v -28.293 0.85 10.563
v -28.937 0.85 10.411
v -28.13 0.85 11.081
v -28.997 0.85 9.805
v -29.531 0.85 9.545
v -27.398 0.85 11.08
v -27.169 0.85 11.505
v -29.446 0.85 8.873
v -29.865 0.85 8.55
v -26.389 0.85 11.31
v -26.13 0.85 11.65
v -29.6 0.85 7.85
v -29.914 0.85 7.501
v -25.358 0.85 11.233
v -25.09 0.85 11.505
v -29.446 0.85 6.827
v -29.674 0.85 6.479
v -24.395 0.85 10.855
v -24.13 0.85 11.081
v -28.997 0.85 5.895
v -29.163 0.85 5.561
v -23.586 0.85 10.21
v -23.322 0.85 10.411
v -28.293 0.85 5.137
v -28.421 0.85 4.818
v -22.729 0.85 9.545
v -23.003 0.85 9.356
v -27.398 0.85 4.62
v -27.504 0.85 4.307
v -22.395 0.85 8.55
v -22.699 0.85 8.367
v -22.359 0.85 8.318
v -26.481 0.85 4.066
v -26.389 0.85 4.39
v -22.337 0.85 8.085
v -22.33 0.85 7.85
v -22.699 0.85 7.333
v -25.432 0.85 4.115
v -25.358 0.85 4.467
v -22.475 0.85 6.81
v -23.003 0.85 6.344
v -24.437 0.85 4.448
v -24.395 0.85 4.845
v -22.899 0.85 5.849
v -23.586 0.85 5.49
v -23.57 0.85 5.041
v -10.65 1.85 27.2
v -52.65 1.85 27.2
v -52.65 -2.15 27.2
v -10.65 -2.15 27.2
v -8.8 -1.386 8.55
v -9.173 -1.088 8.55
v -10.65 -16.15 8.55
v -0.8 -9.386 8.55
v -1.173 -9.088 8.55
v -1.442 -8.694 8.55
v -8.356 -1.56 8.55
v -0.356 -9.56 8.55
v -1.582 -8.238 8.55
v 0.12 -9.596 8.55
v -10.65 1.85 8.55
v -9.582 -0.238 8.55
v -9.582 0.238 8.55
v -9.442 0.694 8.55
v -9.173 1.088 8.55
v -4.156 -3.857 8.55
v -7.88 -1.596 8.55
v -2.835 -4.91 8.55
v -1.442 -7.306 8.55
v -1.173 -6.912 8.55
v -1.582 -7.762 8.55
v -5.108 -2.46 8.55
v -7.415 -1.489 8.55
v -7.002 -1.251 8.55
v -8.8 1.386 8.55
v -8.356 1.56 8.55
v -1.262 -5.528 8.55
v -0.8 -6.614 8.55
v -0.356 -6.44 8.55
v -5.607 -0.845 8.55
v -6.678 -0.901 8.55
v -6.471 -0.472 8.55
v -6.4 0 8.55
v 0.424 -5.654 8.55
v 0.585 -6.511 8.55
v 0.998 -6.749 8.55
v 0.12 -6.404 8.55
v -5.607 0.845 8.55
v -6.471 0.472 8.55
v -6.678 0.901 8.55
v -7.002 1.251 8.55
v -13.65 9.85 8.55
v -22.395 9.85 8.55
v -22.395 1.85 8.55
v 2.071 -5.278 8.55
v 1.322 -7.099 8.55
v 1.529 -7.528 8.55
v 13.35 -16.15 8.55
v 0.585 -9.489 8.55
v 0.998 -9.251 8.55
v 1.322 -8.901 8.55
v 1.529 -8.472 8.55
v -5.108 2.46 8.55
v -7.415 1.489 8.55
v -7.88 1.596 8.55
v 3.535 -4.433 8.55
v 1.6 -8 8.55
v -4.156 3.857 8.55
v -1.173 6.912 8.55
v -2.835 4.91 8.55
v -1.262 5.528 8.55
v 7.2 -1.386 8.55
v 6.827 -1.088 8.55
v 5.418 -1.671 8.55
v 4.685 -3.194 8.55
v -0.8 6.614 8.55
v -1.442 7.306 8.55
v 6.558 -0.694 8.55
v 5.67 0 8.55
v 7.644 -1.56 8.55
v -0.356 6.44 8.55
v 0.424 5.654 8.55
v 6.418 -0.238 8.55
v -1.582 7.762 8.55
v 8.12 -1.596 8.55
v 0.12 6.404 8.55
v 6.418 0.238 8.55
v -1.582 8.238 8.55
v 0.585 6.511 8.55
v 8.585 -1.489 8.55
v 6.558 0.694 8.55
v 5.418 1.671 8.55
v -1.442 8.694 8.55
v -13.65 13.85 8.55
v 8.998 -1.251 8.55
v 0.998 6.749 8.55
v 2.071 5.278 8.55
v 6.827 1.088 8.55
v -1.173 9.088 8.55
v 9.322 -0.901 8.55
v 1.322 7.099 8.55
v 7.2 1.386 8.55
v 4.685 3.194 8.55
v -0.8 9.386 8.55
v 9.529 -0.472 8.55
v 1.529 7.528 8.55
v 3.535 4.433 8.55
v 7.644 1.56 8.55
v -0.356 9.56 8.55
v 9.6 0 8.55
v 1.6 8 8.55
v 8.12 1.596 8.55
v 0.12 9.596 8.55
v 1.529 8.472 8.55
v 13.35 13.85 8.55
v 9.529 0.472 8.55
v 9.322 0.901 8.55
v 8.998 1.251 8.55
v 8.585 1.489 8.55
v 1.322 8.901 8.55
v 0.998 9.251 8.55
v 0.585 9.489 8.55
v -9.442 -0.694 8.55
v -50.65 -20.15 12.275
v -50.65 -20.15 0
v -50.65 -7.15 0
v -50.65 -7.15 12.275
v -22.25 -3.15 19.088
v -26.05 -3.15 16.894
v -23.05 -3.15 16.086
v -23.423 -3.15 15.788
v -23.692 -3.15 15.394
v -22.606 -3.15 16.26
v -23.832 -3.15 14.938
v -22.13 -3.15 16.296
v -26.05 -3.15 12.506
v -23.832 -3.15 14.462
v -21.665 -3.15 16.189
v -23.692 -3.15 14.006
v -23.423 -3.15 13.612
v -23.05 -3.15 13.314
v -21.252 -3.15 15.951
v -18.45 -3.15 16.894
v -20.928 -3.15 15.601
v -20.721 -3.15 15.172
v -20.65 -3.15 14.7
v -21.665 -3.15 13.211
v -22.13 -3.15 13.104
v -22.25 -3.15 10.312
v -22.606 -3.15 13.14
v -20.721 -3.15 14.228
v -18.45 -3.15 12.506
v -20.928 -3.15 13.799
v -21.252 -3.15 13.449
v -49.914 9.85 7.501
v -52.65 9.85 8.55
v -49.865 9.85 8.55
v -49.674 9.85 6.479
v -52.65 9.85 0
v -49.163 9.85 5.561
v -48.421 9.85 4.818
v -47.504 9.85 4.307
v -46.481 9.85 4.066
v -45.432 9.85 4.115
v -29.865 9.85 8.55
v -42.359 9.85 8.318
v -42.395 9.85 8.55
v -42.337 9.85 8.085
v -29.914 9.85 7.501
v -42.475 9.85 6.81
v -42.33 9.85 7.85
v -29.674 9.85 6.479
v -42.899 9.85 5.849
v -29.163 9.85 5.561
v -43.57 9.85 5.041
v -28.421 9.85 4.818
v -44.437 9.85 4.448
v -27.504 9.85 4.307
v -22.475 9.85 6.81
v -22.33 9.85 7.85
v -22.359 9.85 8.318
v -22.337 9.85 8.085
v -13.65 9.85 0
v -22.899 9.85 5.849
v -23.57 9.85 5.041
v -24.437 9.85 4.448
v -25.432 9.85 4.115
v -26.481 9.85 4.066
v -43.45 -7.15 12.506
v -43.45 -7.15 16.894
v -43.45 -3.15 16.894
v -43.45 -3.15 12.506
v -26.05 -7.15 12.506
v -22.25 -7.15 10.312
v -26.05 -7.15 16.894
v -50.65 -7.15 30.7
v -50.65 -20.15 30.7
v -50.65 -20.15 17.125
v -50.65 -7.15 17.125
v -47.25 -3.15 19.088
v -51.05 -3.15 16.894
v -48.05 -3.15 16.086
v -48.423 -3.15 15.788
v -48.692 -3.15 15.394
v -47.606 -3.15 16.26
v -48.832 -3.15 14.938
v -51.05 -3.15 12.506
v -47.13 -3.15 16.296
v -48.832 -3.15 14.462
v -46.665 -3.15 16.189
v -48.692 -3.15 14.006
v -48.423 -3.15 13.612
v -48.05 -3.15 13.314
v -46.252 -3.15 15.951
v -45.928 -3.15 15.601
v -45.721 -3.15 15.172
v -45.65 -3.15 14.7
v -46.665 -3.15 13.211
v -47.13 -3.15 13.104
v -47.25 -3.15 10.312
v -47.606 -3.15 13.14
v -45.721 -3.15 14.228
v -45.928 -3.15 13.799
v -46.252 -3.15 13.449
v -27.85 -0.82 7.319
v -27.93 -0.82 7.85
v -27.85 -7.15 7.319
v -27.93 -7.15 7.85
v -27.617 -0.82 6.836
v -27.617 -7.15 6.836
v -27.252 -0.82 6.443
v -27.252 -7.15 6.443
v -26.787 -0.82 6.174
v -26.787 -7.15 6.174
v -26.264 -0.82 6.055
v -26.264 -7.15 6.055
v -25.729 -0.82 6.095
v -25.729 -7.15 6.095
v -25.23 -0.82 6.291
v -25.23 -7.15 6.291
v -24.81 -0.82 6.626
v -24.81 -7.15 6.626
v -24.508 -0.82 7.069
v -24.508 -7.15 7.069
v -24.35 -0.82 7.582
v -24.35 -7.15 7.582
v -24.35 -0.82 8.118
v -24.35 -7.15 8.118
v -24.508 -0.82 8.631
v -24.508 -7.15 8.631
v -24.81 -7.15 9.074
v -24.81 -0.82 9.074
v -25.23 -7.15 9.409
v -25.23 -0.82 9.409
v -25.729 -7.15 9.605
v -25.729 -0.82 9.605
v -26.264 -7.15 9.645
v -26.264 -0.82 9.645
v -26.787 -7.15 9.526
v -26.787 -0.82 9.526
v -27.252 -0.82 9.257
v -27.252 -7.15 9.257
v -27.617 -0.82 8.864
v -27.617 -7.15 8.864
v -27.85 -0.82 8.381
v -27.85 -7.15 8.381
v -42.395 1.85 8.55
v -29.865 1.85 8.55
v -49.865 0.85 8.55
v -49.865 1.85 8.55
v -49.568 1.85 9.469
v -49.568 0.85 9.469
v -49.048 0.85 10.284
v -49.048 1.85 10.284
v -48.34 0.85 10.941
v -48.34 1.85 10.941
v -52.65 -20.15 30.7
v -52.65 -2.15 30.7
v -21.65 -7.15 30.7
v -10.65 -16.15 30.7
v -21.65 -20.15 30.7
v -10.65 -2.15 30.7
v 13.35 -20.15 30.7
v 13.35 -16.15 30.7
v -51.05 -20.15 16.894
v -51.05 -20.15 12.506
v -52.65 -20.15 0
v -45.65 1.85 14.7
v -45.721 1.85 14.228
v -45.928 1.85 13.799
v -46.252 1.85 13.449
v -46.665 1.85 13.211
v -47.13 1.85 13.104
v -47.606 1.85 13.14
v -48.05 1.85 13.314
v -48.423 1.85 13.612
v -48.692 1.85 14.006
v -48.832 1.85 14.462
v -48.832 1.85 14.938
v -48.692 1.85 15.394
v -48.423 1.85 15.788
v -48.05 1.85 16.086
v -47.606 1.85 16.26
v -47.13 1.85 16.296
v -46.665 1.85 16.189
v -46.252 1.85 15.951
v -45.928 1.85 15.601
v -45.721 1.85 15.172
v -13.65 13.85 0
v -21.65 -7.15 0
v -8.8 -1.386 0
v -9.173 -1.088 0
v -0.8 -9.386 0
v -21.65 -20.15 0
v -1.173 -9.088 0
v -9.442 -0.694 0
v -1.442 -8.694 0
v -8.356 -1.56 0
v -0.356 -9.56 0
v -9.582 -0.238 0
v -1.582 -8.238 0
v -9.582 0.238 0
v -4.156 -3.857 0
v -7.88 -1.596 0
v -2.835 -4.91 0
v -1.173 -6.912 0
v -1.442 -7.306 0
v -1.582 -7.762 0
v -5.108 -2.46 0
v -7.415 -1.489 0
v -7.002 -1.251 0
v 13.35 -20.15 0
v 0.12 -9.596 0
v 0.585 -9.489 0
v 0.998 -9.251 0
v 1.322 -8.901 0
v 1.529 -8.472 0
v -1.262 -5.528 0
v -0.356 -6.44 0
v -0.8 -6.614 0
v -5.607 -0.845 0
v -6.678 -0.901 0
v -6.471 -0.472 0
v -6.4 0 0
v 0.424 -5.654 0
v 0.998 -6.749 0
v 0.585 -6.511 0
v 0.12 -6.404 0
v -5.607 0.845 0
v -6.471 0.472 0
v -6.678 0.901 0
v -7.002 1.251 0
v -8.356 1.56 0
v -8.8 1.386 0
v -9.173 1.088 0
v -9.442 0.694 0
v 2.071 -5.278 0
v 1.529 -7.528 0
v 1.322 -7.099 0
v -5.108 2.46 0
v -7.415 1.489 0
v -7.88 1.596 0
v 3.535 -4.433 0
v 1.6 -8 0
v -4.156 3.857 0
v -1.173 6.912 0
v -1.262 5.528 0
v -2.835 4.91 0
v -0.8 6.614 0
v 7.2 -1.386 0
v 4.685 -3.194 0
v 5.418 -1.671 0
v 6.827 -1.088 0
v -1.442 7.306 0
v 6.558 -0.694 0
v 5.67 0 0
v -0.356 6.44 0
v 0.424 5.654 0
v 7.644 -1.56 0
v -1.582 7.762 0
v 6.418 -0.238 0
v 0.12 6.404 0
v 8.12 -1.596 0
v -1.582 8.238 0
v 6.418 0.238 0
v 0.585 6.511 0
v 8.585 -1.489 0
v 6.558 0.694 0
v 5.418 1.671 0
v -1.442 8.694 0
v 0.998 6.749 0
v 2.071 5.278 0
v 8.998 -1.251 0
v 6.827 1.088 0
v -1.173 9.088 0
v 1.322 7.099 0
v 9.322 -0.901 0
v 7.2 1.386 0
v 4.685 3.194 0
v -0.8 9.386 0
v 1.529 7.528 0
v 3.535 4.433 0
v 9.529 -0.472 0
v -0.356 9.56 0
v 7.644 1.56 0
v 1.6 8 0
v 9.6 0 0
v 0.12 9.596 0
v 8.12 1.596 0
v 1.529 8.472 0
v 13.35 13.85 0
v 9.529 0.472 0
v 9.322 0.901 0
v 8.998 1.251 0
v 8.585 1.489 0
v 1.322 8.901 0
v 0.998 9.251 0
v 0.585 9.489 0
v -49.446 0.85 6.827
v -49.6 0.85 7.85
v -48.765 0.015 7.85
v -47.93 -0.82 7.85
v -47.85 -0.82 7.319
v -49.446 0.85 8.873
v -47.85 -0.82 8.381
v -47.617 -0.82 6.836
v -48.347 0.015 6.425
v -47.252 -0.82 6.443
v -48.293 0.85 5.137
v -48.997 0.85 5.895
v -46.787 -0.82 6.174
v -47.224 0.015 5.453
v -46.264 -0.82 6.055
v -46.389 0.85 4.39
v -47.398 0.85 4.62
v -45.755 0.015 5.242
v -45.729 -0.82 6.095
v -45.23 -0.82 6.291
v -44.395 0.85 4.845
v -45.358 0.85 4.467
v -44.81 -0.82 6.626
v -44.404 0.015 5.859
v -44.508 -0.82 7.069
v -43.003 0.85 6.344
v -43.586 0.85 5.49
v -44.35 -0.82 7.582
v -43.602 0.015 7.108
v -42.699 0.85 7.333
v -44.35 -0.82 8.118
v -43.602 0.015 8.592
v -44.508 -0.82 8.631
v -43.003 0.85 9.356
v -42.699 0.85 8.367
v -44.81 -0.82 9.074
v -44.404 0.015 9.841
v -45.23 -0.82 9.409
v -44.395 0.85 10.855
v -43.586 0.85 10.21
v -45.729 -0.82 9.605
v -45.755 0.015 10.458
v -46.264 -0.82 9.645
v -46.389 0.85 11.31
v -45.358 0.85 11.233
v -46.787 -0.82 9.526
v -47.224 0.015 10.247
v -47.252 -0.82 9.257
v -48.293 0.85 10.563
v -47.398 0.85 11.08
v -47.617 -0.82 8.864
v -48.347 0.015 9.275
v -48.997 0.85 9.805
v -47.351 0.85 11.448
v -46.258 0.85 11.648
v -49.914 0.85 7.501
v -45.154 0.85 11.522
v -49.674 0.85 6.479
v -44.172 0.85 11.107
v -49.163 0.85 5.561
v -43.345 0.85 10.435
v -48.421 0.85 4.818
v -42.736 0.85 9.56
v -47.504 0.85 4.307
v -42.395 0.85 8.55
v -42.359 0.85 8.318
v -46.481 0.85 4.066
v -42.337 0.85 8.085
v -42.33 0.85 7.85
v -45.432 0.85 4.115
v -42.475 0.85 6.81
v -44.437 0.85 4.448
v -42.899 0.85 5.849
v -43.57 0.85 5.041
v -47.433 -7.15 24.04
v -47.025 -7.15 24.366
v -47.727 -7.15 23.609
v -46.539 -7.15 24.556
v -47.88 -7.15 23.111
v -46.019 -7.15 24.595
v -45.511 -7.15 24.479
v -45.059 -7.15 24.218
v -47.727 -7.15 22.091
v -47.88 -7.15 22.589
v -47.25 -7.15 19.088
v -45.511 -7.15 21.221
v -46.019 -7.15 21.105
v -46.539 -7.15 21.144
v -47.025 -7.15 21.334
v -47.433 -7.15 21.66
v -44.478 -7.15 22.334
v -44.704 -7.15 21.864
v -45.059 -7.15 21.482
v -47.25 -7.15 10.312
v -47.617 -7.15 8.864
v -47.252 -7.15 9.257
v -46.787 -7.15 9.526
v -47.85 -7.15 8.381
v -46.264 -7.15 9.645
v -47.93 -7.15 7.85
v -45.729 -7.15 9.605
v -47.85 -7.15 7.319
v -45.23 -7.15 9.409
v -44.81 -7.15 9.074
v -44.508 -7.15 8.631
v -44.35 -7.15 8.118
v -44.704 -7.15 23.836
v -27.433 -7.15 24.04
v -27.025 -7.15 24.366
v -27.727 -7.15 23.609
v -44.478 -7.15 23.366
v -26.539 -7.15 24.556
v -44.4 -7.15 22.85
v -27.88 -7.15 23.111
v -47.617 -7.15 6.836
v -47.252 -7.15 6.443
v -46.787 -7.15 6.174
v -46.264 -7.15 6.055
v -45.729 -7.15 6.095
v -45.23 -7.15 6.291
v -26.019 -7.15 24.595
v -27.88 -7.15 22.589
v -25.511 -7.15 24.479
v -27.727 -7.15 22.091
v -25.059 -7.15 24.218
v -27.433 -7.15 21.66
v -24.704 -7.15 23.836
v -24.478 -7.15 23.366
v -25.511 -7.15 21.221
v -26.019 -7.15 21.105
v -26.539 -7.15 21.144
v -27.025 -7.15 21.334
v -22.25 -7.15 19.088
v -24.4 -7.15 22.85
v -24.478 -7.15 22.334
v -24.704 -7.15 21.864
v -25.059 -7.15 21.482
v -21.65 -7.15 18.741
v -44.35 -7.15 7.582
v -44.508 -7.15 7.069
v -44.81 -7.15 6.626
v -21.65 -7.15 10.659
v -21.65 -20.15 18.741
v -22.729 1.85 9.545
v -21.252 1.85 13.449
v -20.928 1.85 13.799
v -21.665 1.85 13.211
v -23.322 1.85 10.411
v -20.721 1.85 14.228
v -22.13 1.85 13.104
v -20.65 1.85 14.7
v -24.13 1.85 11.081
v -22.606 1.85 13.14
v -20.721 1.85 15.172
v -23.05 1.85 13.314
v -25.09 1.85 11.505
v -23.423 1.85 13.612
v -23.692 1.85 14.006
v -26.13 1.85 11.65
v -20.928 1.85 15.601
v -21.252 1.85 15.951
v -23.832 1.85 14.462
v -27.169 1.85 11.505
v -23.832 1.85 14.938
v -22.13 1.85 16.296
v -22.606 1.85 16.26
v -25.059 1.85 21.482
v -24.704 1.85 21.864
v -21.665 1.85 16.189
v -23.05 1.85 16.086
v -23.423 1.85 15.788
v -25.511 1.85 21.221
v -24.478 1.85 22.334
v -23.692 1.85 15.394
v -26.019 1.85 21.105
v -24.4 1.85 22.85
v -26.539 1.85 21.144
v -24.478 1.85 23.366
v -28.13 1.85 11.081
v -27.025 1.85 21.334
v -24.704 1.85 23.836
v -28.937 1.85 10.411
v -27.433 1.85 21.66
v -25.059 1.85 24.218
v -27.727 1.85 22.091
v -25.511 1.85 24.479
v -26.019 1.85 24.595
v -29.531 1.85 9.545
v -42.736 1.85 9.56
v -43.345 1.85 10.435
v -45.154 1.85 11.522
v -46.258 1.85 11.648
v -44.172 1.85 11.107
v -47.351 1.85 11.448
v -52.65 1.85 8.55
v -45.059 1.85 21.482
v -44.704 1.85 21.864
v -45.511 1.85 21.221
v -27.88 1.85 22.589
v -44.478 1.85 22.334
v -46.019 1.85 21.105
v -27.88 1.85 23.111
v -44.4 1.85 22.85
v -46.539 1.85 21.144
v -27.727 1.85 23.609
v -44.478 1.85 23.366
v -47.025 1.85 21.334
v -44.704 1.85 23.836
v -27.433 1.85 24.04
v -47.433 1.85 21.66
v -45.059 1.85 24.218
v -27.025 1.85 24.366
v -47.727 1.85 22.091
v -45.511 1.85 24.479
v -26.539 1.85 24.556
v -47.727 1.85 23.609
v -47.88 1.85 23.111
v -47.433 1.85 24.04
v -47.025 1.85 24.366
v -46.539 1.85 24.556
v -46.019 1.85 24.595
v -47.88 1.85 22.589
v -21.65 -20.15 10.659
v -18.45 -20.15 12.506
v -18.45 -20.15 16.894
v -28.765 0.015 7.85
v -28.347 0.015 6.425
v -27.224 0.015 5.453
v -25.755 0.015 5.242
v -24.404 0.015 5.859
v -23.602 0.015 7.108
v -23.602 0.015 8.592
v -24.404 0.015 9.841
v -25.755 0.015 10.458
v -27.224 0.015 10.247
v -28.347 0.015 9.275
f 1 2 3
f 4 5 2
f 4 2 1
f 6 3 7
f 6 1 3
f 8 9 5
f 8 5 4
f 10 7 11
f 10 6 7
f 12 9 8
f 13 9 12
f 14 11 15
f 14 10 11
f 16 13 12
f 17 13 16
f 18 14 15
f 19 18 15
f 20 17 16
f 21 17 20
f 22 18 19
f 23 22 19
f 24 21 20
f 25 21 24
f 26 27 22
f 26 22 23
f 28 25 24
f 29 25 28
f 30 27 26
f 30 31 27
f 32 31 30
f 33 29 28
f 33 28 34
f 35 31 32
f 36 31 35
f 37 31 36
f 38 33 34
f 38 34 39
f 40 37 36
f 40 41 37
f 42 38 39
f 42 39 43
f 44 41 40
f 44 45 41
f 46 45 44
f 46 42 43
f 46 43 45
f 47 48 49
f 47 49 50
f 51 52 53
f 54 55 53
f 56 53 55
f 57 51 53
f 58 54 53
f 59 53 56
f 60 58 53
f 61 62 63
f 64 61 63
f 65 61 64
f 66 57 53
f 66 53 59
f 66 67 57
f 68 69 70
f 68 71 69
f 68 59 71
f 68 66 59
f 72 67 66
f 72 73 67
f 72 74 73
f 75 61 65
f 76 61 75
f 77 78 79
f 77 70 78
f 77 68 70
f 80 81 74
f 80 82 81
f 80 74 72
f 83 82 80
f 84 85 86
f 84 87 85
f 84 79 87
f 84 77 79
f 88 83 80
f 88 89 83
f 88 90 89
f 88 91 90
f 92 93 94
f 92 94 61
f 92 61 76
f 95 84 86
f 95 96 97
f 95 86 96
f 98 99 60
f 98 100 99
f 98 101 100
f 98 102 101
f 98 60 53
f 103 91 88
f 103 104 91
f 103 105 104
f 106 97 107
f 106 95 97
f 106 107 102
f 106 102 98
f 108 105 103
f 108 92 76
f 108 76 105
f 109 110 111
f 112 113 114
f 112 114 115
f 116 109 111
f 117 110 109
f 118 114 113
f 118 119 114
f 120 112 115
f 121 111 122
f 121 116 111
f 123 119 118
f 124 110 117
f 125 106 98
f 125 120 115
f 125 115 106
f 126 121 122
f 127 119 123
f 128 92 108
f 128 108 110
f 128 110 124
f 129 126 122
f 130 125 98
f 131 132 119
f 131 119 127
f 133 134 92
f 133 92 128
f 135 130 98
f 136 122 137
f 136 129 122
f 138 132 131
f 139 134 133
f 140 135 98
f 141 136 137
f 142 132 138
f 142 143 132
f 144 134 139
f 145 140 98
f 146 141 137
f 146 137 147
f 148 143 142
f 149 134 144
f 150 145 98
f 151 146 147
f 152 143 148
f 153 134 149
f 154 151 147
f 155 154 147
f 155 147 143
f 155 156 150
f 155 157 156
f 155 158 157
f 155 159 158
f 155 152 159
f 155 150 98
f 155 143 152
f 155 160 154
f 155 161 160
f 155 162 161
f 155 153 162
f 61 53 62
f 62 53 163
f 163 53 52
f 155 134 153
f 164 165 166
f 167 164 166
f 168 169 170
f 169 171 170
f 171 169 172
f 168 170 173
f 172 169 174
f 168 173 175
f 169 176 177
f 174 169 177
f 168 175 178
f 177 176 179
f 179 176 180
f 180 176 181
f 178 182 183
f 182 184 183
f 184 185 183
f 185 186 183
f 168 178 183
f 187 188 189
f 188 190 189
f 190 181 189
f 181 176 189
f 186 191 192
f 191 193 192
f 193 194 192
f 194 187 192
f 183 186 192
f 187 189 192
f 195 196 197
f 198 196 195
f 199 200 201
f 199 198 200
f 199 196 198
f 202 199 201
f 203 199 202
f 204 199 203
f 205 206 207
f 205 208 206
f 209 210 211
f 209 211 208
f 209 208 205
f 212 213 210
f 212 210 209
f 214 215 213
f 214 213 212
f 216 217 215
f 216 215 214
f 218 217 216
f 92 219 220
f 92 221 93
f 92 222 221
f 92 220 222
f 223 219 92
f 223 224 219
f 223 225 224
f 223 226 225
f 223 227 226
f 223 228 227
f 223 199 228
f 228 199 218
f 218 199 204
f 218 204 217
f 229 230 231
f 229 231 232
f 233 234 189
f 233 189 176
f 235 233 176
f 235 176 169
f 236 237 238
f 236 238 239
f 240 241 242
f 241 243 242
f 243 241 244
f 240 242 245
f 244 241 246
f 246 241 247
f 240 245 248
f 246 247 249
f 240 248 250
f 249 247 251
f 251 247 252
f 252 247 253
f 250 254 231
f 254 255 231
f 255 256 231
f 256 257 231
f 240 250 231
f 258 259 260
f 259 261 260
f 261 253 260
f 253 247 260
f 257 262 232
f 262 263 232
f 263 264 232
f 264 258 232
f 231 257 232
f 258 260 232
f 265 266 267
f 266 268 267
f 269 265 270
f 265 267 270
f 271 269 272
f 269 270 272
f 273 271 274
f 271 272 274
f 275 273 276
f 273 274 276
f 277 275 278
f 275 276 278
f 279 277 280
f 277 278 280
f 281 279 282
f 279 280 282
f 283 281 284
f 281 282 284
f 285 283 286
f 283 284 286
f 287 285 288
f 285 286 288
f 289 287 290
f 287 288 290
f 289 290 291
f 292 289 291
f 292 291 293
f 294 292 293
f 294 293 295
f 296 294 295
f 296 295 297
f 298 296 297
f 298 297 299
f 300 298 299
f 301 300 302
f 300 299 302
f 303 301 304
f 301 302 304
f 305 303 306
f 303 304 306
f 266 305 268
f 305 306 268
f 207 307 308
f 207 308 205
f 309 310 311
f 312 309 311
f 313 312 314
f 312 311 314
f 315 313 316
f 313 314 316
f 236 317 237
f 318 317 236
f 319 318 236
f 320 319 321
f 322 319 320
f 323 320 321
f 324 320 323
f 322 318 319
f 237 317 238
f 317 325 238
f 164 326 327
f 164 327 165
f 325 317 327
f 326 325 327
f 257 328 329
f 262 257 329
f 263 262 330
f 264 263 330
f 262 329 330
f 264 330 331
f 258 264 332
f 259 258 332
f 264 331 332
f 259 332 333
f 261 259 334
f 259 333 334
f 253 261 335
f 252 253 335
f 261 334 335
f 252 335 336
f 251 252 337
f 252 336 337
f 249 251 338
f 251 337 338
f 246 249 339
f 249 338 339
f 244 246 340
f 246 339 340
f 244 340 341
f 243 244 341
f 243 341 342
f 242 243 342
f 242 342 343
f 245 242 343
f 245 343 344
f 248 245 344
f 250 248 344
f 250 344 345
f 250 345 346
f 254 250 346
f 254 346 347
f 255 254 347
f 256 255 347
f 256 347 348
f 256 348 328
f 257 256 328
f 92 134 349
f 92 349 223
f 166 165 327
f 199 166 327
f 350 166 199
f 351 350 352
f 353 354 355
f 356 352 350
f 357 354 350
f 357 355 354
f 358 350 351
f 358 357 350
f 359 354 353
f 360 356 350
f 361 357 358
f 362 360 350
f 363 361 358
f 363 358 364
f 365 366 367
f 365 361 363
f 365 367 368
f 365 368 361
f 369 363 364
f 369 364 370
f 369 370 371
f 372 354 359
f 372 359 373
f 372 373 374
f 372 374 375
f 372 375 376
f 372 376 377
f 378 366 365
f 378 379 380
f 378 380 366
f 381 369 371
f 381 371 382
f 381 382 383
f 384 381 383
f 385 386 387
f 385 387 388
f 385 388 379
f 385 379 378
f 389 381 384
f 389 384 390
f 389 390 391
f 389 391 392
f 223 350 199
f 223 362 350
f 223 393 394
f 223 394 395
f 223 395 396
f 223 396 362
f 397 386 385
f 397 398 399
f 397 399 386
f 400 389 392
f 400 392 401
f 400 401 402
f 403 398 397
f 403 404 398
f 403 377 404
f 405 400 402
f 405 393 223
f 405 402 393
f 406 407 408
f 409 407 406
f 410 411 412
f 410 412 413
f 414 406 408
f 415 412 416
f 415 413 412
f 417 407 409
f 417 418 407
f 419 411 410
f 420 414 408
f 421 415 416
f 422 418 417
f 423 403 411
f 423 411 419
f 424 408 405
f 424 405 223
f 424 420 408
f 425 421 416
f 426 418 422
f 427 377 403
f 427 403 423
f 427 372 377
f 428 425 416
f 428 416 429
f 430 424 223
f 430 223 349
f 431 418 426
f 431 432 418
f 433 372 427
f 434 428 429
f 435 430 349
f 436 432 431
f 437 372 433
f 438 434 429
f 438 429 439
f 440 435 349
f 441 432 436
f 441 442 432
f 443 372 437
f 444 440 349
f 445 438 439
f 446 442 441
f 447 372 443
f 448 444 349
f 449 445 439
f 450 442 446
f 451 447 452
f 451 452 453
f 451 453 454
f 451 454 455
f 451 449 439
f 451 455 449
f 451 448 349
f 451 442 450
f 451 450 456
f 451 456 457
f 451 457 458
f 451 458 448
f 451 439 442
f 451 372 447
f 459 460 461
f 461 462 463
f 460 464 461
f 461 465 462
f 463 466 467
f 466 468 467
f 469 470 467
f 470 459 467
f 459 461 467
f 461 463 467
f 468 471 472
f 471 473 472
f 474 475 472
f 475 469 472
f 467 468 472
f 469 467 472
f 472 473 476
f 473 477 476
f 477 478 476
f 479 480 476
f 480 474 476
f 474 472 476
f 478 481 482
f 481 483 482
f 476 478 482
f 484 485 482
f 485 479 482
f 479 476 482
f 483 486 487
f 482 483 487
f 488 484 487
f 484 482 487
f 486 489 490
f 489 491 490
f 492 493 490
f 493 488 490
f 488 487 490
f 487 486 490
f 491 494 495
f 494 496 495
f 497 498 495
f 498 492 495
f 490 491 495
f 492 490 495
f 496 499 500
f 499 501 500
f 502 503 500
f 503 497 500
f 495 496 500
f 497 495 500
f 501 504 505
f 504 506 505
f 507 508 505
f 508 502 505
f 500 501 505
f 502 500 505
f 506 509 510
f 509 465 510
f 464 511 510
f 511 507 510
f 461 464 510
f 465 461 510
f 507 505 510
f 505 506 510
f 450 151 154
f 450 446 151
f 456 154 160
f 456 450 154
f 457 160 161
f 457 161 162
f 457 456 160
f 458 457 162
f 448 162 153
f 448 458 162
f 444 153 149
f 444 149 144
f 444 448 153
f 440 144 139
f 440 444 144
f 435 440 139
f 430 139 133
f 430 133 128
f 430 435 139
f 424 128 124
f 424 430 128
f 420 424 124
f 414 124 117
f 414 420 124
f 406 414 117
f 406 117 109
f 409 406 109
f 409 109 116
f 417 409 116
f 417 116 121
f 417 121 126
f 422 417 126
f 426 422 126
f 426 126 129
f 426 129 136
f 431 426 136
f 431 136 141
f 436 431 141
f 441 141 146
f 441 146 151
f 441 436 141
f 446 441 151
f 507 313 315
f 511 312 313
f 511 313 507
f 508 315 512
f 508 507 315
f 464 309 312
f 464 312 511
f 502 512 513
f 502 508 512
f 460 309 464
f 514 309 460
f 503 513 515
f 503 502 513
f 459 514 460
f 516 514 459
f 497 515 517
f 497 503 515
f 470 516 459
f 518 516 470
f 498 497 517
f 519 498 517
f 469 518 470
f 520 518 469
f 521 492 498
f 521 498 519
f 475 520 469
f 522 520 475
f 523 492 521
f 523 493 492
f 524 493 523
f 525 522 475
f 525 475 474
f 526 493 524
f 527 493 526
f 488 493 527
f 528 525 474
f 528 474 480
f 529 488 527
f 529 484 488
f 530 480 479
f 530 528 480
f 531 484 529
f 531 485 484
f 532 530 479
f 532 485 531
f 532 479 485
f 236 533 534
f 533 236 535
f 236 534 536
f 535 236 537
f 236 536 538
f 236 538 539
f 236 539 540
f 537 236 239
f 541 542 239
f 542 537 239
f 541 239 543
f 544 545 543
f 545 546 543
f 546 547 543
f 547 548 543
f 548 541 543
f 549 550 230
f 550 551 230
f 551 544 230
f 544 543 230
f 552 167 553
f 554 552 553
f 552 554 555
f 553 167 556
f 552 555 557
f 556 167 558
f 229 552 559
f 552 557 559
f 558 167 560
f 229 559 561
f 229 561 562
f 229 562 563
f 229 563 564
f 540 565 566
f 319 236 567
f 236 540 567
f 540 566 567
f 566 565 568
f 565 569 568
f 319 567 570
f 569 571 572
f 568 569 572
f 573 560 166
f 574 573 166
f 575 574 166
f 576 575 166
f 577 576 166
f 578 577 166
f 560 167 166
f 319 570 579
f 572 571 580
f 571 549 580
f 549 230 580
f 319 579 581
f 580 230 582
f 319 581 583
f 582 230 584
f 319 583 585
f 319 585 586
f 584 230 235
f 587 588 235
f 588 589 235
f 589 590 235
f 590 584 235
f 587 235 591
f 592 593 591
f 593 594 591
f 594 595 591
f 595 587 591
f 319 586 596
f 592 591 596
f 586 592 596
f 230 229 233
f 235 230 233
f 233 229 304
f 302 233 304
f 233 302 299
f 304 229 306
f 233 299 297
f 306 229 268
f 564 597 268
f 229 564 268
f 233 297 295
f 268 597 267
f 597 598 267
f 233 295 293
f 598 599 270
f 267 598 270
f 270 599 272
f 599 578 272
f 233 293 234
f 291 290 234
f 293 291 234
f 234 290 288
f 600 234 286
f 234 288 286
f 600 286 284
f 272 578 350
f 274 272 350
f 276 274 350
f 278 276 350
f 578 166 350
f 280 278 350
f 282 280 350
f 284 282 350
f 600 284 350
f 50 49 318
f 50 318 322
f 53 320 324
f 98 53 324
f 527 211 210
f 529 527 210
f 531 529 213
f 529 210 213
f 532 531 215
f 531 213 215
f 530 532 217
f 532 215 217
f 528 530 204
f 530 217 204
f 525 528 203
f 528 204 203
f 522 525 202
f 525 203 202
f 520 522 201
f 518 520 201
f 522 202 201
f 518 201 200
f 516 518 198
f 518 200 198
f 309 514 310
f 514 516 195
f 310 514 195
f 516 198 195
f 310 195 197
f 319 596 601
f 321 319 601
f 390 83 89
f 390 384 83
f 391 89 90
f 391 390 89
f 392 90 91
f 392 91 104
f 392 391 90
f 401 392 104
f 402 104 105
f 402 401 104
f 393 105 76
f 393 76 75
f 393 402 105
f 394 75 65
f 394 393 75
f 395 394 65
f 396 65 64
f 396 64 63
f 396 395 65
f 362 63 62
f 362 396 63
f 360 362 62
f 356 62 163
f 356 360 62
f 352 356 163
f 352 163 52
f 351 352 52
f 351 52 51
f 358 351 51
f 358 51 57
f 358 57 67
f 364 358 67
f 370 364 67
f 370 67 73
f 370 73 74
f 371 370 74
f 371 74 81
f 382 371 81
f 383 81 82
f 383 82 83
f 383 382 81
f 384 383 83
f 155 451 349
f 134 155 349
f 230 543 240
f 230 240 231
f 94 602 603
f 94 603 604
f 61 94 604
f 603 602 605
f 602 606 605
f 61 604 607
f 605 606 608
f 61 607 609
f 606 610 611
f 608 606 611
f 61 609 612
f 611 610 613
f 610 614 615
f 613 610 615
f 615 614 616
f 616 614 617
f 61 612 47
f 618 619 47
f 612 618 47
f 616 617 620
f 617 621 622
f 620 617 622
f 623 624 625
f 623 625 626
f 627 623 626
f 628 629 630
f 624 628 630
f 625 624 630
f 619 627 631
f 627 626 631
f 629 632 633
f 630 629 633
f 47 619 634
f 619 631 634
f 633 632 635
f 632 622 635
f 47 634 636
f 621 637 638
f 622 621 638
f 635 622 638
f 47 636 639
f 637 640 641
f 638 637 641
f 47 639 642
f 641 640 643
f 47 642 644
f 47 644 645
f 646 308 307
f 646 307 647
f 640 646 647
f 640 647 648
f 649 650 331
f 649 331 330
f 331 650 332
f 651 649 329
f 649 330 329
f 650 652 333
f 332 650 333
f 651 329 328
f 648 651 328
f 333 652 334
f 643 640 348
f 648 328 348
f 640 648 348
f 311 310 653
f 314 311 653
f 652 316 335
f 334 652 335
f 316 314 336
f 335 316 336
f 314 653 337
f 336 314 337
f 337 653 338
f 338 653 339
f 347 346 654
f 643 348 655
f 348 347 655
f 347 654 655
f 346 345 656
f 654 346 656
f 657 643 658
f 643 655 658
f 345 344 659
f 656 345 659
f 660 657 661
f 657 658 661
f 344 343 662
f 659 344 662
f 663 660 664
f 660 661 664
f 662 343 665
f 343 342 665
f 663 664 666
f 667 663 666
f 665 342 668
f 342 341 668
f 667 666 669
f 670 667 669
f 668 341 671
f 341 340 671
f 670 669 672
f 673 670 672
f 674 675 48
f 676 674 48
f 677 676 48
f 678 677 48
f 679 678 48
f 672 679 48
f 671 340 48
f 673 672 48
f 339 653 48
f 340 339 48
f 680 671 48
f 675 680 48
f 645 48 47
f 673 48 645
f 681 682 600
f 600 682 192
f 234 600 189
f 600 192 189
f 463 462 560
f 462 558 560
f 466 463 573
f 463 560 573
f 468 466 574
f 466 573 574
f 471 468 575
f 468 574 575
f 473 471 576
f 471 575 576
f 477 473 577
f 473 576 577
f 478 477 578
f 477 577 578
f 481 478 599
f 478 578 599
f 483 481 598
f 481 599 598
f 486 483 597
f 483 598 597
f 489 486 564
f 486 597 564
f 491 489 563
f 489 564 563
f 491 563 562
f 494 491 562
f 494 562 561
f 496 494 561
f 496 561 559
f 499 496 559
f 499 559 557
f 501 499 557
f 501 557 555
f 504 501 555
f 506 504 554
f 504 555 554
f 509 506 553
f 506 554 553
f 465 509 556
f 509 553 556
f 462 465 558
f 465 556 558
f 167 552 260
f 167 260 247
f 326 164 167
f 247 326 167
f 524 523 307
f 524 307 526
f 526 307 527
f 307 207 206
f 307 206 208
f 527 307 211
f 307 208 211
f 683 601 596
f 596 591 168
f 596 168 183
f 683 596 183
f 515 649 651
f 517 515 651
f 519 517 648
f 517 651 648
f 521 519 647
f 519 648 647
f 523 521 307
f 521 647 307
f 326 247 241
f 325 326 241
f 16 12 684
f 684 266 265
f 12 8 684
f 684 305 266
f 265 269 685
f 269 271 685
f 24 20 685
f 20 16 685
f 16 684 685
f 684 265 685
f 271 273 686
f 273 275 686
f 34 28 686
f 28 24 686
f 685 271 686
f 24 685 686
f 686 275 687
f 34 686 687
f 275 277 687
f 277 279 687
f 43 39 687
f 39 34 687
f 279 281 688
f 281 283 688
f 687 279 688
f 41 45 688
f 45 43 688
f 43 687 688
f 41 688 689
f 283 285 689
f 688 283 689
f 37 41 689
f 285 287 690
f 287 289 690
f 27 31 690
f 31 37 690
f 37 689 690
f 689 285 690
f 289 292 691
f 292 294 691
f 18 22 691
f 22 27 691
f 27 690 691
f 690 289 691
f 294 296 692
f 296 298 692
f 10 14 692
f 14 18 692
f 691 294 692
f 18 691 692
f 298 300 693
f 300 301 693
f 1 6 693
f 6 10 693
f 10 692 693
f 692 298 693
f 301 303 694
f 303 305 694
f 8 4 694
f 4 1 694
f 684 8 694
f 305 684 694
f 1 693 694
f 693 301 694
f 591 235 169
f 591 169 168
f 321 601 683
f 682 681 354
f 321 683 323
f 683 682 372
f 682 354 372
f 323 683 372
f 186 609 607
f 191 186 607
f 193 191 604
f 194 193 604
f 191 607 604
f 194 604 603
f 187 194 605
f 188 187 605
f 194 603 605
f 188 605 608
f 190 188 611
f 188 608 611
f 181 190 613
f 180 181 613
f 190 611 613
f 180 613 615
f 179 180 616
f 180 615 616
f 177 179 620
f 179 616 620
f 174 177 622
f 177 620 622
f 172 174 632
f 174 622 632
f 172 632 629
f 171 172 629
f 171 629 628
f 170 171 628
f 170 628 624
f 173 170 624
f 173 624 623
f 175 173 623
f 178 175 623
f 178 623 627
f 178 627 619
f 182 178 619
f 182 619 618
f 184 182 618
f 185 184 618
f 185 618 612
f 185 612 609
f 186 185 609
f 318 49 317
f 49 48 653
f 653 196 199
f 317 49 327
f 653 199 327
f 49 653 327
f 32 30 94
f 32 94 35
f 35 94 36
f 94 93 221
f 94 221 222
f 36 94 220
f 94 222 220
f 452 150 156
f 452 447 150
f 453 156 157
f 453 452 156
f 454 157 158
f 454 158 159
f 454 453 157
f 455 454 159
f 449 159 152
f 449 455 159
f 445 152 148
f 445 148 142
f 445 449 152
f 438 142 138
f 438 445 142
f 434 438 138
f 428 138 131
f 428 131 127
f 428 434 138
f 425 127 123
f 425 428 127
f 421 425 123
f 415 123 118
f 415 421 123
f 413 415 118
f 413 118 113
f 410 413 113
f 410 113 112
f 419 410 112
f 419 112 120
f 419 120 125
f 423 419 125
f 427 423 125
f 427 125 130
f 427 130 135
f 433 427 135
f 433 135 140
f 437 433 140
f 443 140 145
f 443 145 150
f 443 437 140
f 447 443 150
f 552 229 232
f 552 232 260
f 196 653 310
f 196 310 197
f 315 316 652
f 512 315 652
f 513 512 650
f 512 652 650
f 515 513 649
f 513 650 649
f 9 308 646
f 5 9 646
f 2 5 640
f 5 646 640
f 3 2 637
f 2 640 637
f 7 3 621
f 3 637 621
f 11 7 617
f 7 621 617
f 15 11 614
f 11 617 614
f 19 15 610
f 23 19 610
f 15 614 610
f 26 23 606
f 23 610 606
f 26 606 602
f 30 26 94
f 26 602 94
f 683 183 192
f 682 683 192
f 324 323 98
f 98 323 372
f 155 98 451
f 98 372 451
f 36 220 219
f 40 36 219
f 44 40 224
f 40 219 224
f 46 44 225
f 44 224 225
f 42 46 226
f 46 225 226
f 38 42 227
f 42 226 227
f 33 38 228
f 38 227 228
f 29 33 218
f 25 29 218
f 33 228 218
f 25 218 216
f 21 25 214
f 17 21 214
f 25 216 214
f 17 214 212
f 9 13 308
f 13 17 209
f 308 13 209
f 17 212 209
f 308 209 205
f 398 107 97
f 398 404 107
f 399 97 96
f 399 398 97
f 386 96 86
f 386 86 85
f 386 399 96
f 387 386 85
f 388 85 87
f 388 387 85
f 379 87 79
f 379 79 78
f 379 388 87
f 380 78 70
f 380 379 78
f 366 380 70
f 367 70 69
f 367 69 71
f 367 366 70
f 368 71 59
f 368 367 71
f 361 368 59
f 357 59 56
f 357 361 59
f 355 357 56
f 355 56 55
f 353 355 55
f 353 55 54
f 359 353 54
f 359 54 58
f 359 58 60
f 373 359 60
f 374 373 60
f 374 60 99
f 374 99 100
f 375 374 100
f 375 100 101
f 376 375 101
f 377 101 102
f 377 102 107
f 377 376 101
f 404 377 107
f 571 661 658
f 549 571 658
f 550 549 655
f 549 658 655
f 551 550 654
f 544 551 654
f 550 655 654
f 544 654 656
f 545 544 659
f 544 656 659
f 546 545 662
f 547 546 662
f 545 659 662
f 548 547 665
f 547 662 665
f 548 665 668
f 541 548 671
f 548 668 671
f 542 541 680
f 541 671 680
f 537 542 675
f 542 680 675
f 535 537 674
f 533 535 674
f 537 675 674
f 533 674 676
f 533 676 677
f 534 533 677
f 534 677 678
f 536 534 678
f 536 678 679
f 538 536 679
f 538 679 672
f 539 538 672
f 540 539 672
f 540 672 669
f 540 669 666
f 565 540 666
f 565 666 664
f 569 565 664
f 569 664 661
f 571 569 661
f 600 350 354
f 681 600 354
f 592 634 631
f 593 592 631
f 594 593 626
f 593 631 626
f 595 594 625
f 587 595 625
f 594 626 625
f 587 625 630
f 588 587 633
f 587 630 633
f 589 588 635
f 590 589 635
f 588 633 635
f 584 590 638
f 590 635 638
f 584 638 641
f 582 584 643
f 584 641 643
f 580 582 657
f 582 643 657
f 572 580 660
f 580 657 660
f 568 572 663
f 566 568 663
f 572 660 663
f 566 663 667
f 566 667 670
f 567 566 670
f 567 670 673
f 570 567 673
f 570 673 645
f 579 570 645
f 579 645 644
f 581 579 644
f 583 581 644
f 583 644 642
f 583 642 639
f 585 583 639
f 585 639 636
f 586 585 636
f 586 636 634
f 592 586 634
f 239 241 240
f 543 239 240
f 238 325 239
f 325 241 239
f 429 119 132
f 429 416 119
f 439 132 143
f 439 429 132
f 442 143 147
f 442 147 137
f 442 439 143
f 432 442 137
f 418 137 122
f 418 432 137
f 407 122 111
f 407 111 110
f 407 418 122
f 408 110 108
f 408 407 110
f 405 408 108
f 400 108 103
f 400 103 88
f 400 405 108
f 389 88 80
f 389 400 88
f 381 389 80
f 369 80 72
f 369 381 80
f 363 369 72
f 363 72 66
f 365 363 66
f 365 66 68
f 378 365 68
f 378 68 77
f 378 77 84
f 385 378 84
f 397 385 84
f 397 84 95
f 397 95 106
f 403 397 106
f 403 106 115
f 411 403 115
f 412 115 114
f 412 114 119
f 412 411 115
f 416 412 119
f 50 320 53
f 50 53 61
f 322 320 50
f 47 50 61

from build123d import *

# Parameters (mm, degrees)
CROQUIS2_R                                           = 10.875
CROQUIS2_R_2                                         = 5.67
CROQUIS2_R_3                                         = 1.6
SALIENTE_EXTRUIR1_DEPTH                              = 30.7
CROQUIS4_W                                           = 24
CROQUIS4_H                                           = 30
CROQUIS4_R                                           = 1.6
CROQUIS4_R_2                                         = 5.67
CORTAR_EXTRUIR2_DEPTH                                = 22.7
CROQUIS3_W                                           = 12.3
CROQUIS3_H                                           = 8
CORTAR_EXTRUIR5_DEPTH                                = 42
CROQUIS5_R                                           = 1.6
CORTAR_EXTRUIR6_DEPTH                                = 35
CROQUIS7_R                                           = 1.6
CORTAR_EXTRUIR7_DEPTH                                = 4
CROQUIS9_W                                           = 8
CROQUIS9_H                                           = 4
SALIENTE_EXTRUIR4_DEPTH                              = 3
CROQUIS7_3_W                                         = 42
CROQUIS7_3_H                                         = 9.85
CORTAR_EXTRUIR8_DEPTH                                = 12
CORTAR_EXTRUIR9_START                                = 8
CORTAR_EXTRUIR9_DEPTH                                = 9
CROQUIS11_3_R                                        = 1.75
CORTAR_EXTRUIR10_DEPTH                               = 23
CORTAR_EXTRUIR11_START                               = -9
CORTAR_EXTRUIR11_DEPTH                               = 4
CORTAR_EXTRUIR11_DEPTH_BACK                          = 23
AVELLANADO_PARA_TORNILLO_CON_CABEZA_AVEL_D           = 3.6
AVELLANADO_PARA_TORNILLO_CON_CABEZA_AVEL_CSINK_D     = 6.94
AVELLANADO_PARA_TORNILLO_CON_CABEZA_AVEL_CSINK_ANGLE = 90
CROQUIS18_W                                          = 42
CROQUIS18_H                                          = 3.5
CORTAR_EXTRUIR12_DEPTH                               = 4
CROQUIS19_R                                          = 5.67
CROQUIS19_R_2                                        = 1.6
SALIENTE_EXTRUIR5_DEPTH                              = 0.55


with BuildPart() as part:
    # Croquis2 → Saliente-Extruir1 (new body)
    with BuildSketch(Plane.XY):
        Polygon((-52.65, 13.85), (-52.65, -20.15), (-50.65, -20.15), (-50.65, -17.65), (-50.65, -7.65), (-50.65, -7.15), (-49.65, -7.15), (-22.65, -7.15), (-21.65, -7.15), (-21.65, -7.65), (-21.65, -17.65), (-21.65, -20.15), (13.35, -20.15), (13.35, 13.85), align=None)
        Circle(CROQUIS2_R, mode=Mode.SUBTRACT)
        Circle(CROQUIS2_R)
        Circle(CROQUIS2_R_2, mode=Mode.SUBTRACT)
        with Locations((0, -8)):
            Circle(CROQUIS2_R_3, mode=Mode.SUBTRACT)
        with Locations((-8, 0)):
            Circle(CROQUIS2_R_3, mode=Mode.SUBTRACT)
        with Locations((8, 0)):
            Circle(CROQUIS2_R_3, mode=Mode.SUBTRACT)
        with Locations((0, 8)):
            Circle(CROQUIS2_R_3, mode=Mode.SUBTRACT)
    extrude(amount=SALIENTE_EXTRUIR1_DEPTH)

    # Croquis4 → Cortar-Extruir2 (cut)
    with BuildSketch(Plane.XY.offset(30.7)):
        with Locations((1.35, -1.15)):
            Rectangle(CROQUIS4_W, CROQUIS4_H)
        with Locations((0, -8)):
            Circle(CROQUIS4_R, mode=Mode.SUBTRACT)
        with Locations((-8, 0)):
            Circle(CROQUIS4_R, mode=Mode.SUBTRACT)
        Circle(CROQUIS4_R_2, mode=Mode.SUBTRACT)
        with Locations((0, 8)):
            Circle(CROQUIS4_R, mode=Mode.SUBTRACT)
        with Locations((8, 0)):
            Circle(CROQUIS4_R, mode=Mode.SUBTRACT)
    extrude(amount=-CORTAR_EXTRUIR2_DEPTH, mode=Mode.SUBTRACT)

    # Croquis3 → Cortar-Extruir5 (cut)
    with BuildSketch(Plane.ZY.offset(52.65)):
        with Locations((14.7, 5.85)):
            Rectangle(CROQUIS3_W, CROQUIS3_H)
    extrude(amount=-CORTAR_EXTRUIR5_DEPTH, mode=Mode.SUBTRACT)

    # Croquis5 → Cortar-Extruir6 (cut, through all)
    with BuildSketch(Plane(origin=(0, 13.85, 0), x_dir=(1, 0, 0), z_dir=(0, 1, 0))):
        with Locations((-47.25, -14.7)):
            Circle(CROQUIS5_R)
        with Locations((-22.25, -14.7)):
            Circle(CROQUIS5_R)
    extrude(amount=-CORTAR_EXTRUIR6_DEPTH, mode=Mode.SUBTRACT)

    # Croquis7 → Cortar-Extruir7 (cut)
    with BuildSketch(Plane(origin=(0, 13.85, 0), x_dir=(1, 0, 0), z_dir=(0, 1, 0))):
        Polygon((-52.65, -8.55), (-52.65, -20.85), (-10.65, -20.85), (-10.65, 0), (-52.65, 0), align=None)
        with Locations((-47.25, -14.7)):
            Circle(CROQUIS7_R, mode=Mode.SUBTRACT)
        with Locations((-22.25, -14.7)):
            Circle(CROQUIS7_R, mode=Mode.SUBTRACT)
    extrude(amount=-CORTAR_EXTRUIR7_DEPTH, mode=Mode.SUBTRACT)

    # Croquis9 → Saliente-Extruir4 (add)
    with BuildSketch(Plane.ZY.offset(10.65)):
        with Locations((4, 11.85)):
            Rectangle(CROQUIS9_W, CROQUIS9_H)
    extrude(amount=SALIENTE_EXTRUIR4_DEPTH)

    # Croquis7<3> → Cortar-Extruir8 (cut)
    with BuildSketch(Plane(origin=(0, 13.85, 0), x_dir=(1, 0, 0), z_dir=(0, 1, 0))):
        with Locations((-31.65, -25.775)):
            Rectangle(CROQUIS7_3_W, CROQUIS7_3_H)
    extrude(amount=-CORTAR_EXTRUIR8_DEPTH, mode=Mode.SUBTRACT)

    # Croquis11 → Cortar-Extruir9 (cut)
    with BuildSketch(Plane(origin=(0, 1.85, 0), x_dir=(1, 0, 0), z_dir=(0, 1, 0)).offset(CORTAR_EXTRUIR9_START)):
        with BuildLine():
            ThreePointArc((-42.32985075, -7.85), (-46.481357833, -4.066292457), (-49.86482063, -8.55))
            Line((-49.86482063, -8.55), (-47.733752244, -8.55))
            ThreePointArc((-47.733752244, -8.55), (-46.487392627, -6.136913952), (-44.37985075, -7.85))
            ThreePointArc((-44.37985075, -7.85), (-44.416764703, -8.207541876), (-44.525949257, -8.55))
            Line((-44.525949257, -8.55), (-42.394880871, -8.55))
            ThreePointArc((-42.394880871, -8.55), (-42.346143207, -8.201507083), (-42.32985075, -7.85))
        make_face()
        with BuildLine():
            Line((-48.33977205, -10.941318141), (-47.25, -10.312137954))
            Line((-47.25, -10.312137954), (-45.153646097, -11.522468444))
            ThreePointArc((-45.153646097, -11.522468444), (-43.344588908, -10.435017692), (-42.394880871, -8.55))
            Line((-42.394880871, -8.55), (-44.525949257, -8.55))
            ThreePointArc((-44.525949257, -8.55), (-46.12985075, -9.6), (-47.733752244, -8.55))
            Line((-47.733752244, -8.55), (-49.86482063, -8.55))
            ThreePointArc((-49.86482063, -8.55), (-49.333759831, -9.893273502), (-48.33977205, -10.941318141))
        make_face()
        with BuildLine():
            Line((-45.153646097, -11.522468444), (-47.25, -10.312137954))
            Line((-47.25, -10.312137954), (-48.33977205, -10.941318141))
            ThreePointArc((-48.33977205, -10.941318141), (-46.811721787, -11.588322069), (-45.153646097, -11.522468444))
        make_face()
        with BuildLine():
            Line((-44.525949257, -8.55), (-47.733752244, -8.55))
            ThreePointArc((-47.733752244, -8.55), (-46.12985075, -9.6), (-44.525949257, -8.55))
        make_face()
        with BuildLine():
            ThreePointArc((-44.37985075, -7.85), (-46.487392627, -6.136913952), (-47.733752244, -8.55))
            Line((-47.733752244, -8.55), (-44.525949257, -8.55))
            ThreePointArc((-44.525949257, -8.55), (-44.416764703, -8.207541876), (-44.37985075, -7.85))
        make_face()
        with BuildLine():
            ThreePointArc((-22.32985075, -7.85), (-26.481357833, -4.066292457), (-29.86482063, -8.55))
            Line((-29.86482063, -8.55), (-27.733752244, -8.55))
            ThreePointArc((-27.733752244, -8.55), (-26.487392627, -6.136913952), (-24.37985075, -7.85))
            ThreePointArc((-24.37985075, -7.85), (-24.416764703, -8.207541876), (-24.525949257, -8.55))
            Line((-24.525949257, -8.55), (-22.394880871, -8.55))
            ThreePointArc((-22.394880871, -8.55), (-22.346143207, -8.201507083), (-22.32985075, -7.85))
        make_face()
        with BuildLine():
            Line((-27.733752244, -8.55), (-29.86482063, -8.55))
            ThreePointArc((-29.86482063, -8.55), (-26.12985075, -11.65), (-22.394880871, -8.55))
            Line((-22.394880871, -8.55), (-24.525949257, -8.55))
            ThreePointArc((-24.525949257, -8.55), (-26.12985075, -9.6), (-27.733752244, -8.55))
        make_face()
        with BuildLine():
            Line((-24.525949257, -8.55), (-27.733752244, -8.55))
            ThreePointArc((-27.733752244, -8.55), (-26.12985075, -9.6), (-24.525949257, -8.55))
        make_face()
        with BuildLine():
            ThreePointArc((-24.37985075, -7.85), (-26.487392627, -6.136913952), (-27.733752244, -8.55))
            Line((-27.733752244, -8.55), (-24.525949257, -8.55))
            ThreePointArc((-24.525949257, -8.55), (-24.416764703, -8.207541876), (-24.37985075, -7.85))
        make_face()
    extrude(amount=-CORTAR_EXTRUIR9_DEPTH, mode=Mode.SUBTRACT)

    # Croquis11<3> → Cortar-Extruir10 (cut, through all)
    with BuildSketch(Plane(origin=(0, 1.85, 0), x_dir=(1, 0, 0), z_dir=(0, 1, 0))):
        with BuildLine():
            Line((-44.525949257, -8.55), (-47.733752244, -8.55))
            ThreePointArc((-47.733752244, -8.55), (-46.12985075, -9.6), (-44.525949257, -8.55))
        make_face()
        with BuildLine():
            ThreePointArc((-44.37985075, -7.85), (-46.487392627, -6.136913952), (-47.733752244, -8.55))
            Line((-47.733752244, -8.55), (-44.525949257, -8.55))
            ThreePointArc((-44.525949257, -8.55), (-44.416764703, -8.207541876), (-44.37985075, -7.85))
        make_face()
        with BuildLine():
            Line((-24.525949257, -8.55), (-27.733752244, -8.55))
            ThreePointArc((-27.733752244, -8.55), (-26.12985075, -9.6), (-24.525949257, -8.55))
        make_face()
        with BuildLine():
            ThreePointArc((-24.37985075, -7.85), (-26.487392627, -6.136913952), (-27.733752244, -8.55))
            Line((-27.733752244, -8.55), (-24.525949257, -8.55))
            ThreePointArc((-24.525949257, -8.55), (-24.416764703, -8.207541876), (-24.37985075, -7.85))
        make_face()
        with Locations((-26.15, -22.849986467)):
            Circle(CROQUIS11_3_R)
        with Locations((-46.15, -22.849986467)):
            Circle(CROQUIS11_3_R)
    extrude(amount=-CORTAR_EXTRUIR10_DEPTH, mode=Mode.SUBTRACT)

    # Croquis11<4> → Cortar-Extruir11 (cut, two sides)
    with BuildSketch(Plane(origin=(0, 1.85, 0), x_dir=(1, 0, 0), z_dir=(0, 1, 0)).offset(CORTAR_EXTRUIR11_START)) as cortar_extruir11_sk:
        Polygon((-47.25, -10.312137954), (-51.05, -12.506068977), (-51.05, -16.893931023), (-47.25, -19.087862046), (-43.45, -16.893931023), (-43.45, -12.506068977), align=None)
        Polygon((-22.25, -10.312137954), (-26.05, -12.506068977), (-26.05, -16.893931023), (-22.25, -19.087862046), (-18.45, -16.893931023), (-18.45, -12.506068977), align=None)
    extrude(amount=CORTAR_EXTRUIR11_DEPTH, mode=Mode.SUBTRACT)
    extrude(cortar_extruir11_sk.sketch, amount=-CORTAR_EXTRUIR11_DEPTH_BACK, mode=Mode.SUBTRACT)

    # Avellanado para tornillo con cabeza avellanada de clavija hexagonal de M31 (through all)
    with Locations(Plane(origin=(0, 0.85, 0), x_dir=(1, 0, 0), z_dir=(0, 1, 0))):
        with Locations((-46.12985075, -7.85), (-26.12985075, -7.85)):
            CounterSinkHole(AVELLANADO_PARA_TORNILLO_CON_CABEZA_AVEL_D / 2, AVELLANADO_PARA_TORNILLO_CON_CABEZA_AVEL_CSINK_D / 2, counter_sink_angle=AVELLANADO_PARA_TORNILLO_CON_CABEZA_AVEL_CSINK_ANGLE)

    # Croquis18 → Cortar-Extruir12 (cut)
    with BuildSketch(Plane(origin=(0, 1.85, 0), x_dir=(1, 0, 0), z_dir=(0, 1, 0))):
        with Locations((-31.65, -28.95)):
            Rectangle(CROQUIS18_W, CROQUIS18_H)
    extrude(amount=-CORTAR_EXTRUIR12_DEPTH, mode=Mode.SUBTRACT)

    # Croquis19 → Saliente-Extruir5 (add)
    with BuildSketch(Plane.XY.offset(8)):
        Polygon((-10.65, 9.85), (-10.65, -16.15), (13.35, -16.15), (13.35, 13.85), (-13.65, 13.85), (-13.65, 9.85), align=None)
        Circle(CROQUIS19_R, mode=Mode.SUBTRACT)
        with Locations((0, -8)):
            Circle(CROQUIS19_R_2, mode=Mode.SUBTRACT)
        with Locations((8, 0)):
            Circle(CROQUIS19_R_2, mode=Mode.SUBTRACT)
        with Locations((0, 8)):
            Circle(CROQUIS19_R_2, mode=Mode.SUBTRACT)
        with Locations((-8, 0)):
            Circle(CROQUIS19_R_2, mode=Mode.SUBTRACT)
    extrude(amount=SALIENTE_EXTRUIR5_DEPTH)


solid = part.part
